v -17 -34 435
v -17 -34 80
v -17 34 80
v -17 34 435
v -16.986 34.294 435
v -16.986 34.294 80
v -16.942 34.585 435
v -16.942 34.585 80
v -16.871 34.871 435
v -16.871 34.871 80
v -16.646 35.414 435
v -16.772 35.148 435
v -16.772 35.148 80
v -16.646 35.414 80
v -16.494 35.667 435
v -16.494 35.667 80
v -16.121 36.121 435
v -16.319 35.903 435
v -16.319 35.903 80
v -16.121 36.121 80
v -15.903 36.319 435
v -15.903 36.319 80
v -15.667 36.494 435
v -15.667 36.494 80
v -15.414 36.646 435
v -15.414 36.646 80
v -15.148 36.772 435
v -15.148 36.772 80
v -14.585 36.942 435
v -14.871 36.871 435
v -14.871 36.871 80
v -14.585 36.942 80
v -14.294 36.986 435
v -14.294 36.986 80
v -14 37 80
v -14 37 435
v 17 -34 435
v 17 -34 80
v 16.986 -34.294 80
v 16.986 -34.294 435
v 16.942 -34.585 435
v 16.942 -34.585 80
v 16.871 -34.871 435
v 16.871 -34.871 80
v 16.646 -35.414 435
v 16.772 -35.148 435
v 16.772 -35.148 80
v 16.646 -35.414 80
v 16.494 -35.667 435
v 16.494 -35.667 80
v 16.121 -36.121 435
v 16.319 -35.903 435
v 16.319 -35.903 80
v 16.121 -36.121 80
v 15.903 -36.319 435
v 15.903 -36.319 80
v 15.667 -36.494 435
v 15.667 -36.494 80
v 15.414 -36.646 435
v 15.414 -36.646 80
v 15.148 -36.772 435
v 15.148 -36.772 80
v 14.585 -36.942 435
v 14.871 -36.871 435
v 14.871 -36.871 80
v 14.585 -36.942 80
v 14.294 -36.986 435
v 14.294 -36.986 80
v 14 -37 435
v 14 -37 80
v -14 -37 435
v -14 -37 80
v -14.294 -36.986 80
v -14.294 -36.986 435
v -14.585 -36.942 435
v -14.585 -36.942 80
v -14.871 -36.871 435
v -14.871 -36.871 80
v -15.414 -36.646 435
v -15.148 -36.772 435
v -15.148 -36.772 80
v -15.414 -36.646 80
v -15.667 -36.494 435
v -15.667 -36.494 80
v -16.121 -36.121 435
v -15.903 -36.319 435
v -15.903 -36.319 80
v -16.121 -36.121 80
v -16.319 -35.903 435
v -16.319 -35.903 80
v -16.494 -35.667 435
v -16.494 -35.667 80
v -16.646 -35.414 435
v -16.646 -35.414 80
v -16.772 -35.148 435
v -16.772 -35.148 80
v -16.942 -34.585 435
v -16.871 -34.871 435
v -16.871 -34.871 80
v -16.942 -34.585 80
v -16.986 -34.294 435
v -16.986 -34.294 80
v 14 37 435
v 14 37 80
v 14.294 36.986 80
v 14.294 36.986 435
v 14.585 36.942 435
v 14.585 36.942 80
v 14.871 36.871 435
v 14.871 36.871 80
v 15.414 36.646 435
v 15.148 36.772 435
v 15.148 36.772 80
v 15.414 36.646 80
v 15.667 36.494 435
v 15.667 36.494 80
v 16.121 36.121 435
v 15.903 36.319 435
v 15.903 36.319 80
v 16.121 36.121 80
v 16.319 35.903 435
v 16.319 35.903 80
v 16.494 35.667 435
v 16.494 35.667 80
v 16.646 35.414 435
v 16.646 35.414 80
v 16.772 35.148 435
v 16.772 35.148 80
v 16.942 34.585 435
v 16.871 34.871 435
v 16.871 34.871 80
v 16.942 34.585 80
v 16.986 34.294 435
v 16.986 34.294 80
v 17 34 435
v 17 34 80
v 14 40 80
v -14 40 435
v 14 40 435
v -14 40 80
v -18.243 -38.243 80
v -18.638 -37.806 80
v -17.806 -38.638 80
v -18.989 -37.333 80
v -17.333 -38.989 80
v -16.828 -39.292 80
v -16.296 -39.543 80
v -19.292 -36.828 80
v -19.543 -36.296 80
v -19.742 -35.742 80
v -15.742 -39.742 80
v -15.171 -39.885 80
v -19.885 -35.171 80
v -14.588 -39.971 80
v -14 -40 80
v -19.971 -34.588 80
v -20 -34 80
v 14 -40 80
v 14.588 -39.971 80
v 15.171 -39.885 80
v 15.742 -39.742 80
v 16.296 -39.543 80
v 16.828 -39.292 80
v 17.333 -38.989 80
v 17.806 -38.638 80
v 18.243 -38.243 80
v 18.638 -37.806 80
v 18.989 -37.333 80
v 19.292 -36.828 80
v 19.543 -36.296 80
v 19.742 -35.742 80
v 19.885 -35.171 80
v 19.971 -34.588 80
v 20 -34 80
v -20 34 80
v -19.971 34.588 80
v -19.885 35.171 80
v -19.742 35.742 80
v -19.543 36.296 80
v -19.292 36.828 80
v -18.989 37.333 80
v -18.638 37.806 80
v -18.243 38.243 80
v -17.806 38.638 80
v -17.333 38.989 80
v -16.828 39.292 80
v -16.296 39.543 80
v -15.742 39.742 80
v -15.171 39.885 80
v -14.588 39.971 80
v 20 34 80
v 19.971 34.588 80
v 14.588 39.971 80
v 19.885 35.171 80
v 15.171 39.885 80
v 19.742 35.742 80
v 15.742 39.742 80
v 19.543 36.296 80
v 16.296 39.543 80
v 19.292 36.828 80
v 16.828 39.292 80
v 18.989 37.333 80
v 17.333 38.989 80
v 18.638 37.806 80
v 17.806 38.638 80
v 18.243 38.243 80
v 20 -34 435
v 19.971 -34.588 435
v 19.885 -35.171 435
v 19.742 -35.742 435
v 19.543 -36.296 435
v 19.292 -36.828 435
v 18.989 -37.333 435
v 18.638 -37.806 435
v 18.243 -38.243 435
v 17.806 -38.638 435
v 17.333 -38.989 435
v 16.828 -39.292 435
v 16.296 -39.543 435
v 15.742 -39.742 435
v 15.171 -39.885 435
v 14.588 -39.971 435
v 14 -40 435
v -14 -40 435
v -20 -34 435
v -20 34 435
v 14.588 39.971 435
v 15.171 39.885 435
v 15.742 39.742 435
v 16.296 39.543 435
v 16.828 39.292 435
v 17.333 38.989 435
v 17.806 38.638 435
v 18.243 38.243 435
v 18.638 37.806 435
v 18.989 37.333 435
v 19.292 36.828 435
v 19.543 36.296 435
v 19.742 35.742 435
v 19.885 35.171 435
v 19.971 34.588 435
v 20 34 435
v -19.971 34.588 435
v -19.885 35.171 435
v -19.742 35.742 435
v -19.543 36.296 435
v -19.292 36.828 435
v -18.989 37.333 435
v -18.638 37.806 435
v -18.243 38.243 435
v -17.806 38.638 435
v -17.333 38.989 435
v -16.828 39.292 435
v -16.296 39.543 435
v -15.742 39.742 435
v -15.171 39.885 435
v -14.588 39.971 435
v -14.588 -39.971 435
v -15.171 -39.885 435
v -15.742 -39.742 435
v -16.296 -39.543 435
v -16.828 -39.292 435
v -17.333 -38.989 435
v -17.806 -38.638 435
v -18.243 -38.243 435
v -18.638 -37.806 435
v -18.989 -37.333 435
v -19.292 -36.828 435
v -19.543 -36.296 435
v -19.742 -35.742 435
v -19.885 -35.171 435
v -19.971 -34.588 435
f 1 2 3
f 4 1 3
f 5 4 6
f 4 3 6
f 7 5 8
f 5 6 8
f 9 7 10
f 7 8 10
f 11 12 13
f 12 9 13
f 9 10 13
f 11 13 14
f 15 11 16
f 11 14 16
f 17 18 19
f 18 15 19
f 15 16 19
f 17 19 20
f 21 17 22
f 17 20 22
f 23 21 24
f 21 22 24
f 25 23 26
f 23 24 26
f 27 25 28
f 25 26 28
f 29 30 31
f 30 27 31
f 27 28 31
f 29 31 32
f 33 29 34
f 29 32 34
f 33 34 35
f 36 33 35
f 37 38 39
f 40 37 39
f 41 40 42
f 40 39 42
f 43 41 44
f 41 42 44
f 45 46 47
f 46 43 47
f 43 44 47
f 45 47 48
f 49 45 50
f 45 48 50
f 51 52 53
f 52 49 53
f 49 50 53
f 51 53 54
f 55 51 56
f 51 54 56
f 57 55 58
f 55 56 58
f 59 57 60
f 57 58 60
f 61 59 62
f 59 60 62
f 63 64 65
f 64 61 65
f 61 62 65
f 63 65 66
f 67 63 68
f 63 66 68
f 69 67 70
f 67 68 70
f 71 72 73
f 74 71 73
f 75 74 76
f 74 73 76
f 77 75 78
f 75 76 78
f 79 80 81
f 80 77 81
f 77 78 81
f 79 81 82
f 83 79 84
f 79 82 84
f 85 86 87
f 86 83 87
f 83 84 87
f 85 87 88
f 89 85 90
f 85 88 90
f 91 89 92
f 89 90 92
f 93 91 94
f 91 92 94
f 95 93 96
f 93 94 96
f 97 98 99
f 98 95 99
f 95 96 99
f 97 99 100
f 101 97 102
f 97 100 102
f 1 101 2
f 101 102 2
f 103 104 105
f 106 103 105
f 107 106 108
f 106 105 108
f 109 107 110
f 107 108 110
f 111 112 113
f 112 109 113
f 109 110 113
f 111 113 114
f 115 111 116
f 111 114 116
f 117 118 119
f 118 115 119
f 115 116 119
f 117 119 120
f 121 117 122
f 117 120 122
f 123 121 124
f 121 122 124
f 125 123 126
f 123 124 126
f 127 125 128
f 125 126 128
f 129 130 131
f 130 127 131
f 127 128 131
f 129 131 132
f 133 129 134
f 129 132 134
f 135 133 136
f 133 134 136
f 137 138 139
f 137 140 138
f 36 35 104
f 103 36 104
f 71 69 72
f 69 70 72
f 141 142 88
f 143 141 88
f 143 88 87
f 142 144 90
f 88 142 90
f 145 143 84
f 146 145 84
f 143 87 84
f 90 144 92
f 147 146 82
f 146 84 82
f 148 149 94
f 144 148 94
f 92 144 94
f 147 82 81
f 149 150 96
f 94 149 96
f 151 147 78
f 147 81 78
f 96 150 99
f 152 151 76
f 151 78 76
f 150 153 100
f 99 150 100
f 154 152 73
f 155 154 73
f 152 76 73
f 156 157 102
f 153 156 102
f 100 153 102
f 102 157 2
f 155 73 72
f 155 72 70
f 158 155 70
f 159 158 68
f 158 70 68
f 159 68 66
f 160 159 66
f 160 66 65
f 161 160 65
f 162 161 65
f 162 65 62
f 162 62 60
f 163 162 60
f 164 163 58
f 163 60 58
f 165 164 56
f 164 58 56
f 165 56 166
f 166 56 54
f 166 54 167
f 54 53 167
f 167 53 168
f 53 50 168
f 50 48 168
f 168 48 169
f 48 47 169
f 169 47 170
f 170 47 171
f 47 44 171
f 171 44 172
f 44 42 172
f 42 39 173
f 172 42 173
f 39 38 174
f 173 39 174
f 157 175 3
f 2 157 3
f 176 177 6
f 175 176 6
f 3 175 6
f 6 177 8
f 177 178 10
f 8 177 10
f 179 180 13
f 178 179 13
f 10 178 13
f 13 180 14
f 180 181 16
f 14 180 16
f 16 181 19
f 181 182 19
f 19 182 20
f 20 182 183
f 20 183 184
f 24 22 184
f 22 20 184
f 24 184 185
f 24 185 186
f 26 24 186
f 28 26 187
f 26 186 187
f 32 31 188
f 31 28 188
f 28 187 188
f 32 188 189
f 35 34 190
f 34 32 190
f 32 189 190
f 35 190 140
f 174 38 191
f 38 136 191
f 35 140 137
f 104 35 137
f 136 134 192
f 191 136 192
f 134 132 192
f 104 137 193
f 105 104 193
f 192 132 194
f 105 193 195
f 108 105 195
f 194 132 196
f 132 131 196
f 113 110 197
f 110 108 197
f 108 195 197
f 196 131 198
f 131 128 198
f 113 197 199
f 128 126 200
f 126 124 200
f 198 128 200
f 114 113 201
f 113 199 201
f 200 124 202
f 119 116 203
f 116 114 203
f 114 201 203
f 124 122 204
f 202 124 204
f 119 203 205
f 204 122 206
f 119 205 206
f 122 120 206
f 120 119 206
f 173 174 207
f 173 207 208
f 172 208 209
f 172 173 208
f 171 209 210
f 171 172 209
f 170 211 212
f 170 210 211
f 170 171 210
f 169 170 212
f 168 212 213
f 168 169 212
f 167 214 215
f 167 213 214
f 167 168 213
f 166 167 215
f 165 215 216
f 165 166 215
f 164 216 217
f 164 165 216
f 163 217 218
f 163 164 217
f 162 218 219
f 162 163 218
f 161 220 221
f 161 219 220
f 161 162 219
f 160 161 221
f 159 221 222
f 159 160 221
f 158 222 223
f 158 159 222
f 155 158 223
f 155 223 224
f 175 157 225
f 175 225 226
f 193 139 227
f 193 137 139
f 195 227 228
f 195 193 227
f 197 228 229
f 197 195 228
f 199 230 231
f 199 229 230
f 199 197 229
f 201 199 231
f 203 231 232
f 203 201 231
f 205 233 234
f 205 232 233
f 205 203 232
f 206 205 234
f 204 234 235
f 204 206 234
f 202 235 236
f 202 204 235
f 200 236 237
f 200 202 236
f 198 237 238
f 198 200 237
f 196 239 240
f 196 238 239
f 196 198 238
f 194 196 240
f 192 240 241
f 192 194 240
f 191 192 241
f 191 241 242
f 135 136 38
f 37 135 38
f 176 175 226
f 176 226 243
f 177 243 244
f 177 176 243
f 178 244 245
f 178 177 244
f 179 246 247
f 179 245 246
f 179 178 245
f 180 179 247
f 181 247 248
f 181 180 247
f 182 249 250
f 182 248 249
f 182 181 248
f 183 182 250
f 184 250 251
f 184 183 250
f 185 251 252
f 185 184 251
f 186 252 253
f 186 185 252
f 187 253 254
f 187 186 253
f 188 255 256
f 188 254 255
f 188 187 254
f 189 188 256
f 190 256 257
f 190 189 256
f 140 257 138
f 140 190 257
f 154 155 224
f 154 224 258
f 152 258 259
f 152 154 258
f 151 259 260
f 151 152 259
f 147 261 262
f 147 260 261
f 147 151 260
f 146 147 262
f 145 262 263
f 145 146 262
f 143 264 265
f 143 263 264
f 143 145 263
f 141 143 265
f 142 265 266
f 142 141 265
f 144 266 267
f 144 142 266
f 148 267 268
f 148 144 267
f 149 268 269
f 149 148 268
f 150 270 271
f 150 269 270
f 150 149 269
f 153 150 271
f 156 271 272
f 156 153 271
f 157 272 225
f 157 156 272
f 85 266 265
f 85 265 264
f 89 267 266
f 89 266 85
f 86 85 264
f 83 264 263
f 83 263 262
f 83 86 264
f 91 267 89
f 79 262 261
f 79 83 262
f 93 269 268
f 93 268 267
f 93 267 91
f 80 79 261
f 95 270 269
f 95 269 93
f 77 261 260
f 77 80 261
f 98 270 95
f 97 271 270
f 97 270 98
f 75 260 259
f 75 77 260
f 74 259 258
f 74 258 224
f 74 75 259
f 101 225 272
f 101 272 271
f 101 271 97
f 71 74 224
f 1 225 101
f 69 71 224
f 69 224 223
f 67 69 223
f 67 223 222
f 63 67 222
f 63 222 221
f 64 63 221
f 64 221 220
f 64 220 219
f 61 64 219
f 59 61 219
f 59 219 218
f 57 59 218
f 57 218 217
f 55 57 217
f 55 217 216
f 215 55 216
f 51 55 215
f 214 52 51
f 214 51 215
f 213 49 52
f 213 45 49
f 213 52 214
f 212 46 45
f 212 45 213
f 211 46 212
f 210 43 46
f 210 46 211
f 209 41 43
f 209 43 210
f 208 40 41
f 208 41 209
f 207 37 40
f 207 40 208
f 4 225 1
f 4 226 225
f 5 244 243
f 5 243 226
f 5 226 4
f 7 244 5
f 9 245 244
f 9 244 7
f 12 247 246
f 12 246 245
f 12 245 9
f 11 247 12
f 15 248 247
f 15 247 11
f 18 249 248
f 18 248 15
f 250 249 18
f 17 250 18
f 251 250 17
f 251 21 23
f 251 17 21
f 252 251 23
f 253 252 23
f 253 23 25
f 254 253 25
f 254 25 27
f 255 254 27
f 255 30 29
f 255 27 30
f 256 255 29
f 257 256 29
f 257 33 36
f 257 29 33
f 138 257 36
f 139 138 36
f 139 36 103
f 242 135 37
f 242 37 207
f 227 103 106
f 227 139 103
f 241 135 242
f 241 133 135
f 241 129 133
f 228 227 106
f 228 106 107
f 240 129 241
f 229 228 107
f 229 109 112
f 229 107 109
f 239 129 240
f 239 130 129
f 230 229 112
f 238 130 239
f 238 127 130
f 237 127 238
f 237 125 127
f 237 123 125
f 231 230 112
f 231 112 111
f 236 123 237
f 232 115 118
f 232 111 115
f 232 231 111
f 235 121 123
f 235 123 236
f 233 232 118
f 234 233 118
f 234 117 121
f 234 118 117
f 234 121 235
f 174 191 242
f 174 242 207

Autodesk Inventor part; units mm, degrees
ref_plane "YZ Plane" through (0, 0, 0) normal (1, 0, 0) x (0, 1, 0)
ref_plane "Start Plane" through (0, 0, 80) normal (0, 0, 1) x (1, 0, 0)
ref_plane "End Plane" through (0, 0, 435) normal (0, 0, 1) x (1, 0, 0)
sketch "Sketch" plane through (0, 0, 0) normal (0, 0, 1) x (1, 0, 0)
  line L0 (-20, -34) -> (-20, 34)
  line L1 (-14, 40) -> (14, 40)
  line L2 (20, 34) -> (20, -34)
  line L3 (14, -40) -> (-14, -40)
  arc A0 (-20, -34) -> (-14, -40) centre (-14, -34) ccw
  arc A1 (20, 34) -> (14, 40) centre (14, 34) ccw
  arc A2 (-14, 40) -> (-20, 34) centre (-14, 34) ccw
  arc A3 (14, -40) -> (20, -34) centre (14, -34) ccw
  arc A4 (-14, 37) -> (-17, 34) centre (-14, 34) ccw
  line L4 (-14, 37) -> (14, 37)
  arc A5 (17, 34) -> (14, 37) centre (14, 34) ccw
  line L5 (17, 34) -> (17, -34)
  arc A6 (14, -37) -> (17, -34) centre (14, -34) ccw
  line L6 (14, -37) -> (-14, -37)
  arc A7 (-17, -34) -> (-14, -37) centre (-14, -34) ccw
  line L7 (-17, -34) -> (-17, 34)
  line L8 (0, 57.7397) -> (0, -57.7397) construction
  line L9 (-29.7397, 0) -> (29.7397, 0) construction
  dimension "d7" = 6
  dimension "d9" = 40
  dimension "d11" = 80
  dimension "d12" = 3
  dimension "d15" = 20
  dimension "d16" = 40
extrude "Body" add sketch "Sketch" along normal up to surface (355 mm away) from surface at 80
sketch "Sketch3" plane through (0, 0, 0) normal (0, 0, 1) x (1, 0, 0)
  line L0 (0, 0) -> (10, 0)
ref_plane "Work Plane3" through (0, 0, 0) normal (0, -1, 0) x (1, 0, 0)
sketch "Sketch4" plane through (0, 0, 0) normal (0, -1, 0) x (1, 0, 0)
  line L0 (-2, 80) -> (12, 80) projected
  line L1 (-2, 435) -> (12, 435) projected
  dimension "d18" = 355
equation "\"d7\" = G_IR"
equation "\"d9\" = G_W"
equation "\"d11\" = G_H"
equation "\"d12\" = G_T"
equation "\"d15\" = 0.5 * d9"
equation "\"d16\" = 0.5 * d11"
equation "\"d3\" = G_L"
equation "\"G_W\" = 40"
equation "\"G_H\" = 80"
equation "\"G_T\" = 3"
equation "\"G_IR\" = 6"
equation "\"G_L\" = d18"
equation "\"d14\" = G_OFFSET_END + B_L"
equation "\"B_L\" = 455"
equation "\"G_OFFSET_END\" = -20"
properties part number "ISO 10799-2 - 80x40x3 - 355" material "Steel, Mild"
